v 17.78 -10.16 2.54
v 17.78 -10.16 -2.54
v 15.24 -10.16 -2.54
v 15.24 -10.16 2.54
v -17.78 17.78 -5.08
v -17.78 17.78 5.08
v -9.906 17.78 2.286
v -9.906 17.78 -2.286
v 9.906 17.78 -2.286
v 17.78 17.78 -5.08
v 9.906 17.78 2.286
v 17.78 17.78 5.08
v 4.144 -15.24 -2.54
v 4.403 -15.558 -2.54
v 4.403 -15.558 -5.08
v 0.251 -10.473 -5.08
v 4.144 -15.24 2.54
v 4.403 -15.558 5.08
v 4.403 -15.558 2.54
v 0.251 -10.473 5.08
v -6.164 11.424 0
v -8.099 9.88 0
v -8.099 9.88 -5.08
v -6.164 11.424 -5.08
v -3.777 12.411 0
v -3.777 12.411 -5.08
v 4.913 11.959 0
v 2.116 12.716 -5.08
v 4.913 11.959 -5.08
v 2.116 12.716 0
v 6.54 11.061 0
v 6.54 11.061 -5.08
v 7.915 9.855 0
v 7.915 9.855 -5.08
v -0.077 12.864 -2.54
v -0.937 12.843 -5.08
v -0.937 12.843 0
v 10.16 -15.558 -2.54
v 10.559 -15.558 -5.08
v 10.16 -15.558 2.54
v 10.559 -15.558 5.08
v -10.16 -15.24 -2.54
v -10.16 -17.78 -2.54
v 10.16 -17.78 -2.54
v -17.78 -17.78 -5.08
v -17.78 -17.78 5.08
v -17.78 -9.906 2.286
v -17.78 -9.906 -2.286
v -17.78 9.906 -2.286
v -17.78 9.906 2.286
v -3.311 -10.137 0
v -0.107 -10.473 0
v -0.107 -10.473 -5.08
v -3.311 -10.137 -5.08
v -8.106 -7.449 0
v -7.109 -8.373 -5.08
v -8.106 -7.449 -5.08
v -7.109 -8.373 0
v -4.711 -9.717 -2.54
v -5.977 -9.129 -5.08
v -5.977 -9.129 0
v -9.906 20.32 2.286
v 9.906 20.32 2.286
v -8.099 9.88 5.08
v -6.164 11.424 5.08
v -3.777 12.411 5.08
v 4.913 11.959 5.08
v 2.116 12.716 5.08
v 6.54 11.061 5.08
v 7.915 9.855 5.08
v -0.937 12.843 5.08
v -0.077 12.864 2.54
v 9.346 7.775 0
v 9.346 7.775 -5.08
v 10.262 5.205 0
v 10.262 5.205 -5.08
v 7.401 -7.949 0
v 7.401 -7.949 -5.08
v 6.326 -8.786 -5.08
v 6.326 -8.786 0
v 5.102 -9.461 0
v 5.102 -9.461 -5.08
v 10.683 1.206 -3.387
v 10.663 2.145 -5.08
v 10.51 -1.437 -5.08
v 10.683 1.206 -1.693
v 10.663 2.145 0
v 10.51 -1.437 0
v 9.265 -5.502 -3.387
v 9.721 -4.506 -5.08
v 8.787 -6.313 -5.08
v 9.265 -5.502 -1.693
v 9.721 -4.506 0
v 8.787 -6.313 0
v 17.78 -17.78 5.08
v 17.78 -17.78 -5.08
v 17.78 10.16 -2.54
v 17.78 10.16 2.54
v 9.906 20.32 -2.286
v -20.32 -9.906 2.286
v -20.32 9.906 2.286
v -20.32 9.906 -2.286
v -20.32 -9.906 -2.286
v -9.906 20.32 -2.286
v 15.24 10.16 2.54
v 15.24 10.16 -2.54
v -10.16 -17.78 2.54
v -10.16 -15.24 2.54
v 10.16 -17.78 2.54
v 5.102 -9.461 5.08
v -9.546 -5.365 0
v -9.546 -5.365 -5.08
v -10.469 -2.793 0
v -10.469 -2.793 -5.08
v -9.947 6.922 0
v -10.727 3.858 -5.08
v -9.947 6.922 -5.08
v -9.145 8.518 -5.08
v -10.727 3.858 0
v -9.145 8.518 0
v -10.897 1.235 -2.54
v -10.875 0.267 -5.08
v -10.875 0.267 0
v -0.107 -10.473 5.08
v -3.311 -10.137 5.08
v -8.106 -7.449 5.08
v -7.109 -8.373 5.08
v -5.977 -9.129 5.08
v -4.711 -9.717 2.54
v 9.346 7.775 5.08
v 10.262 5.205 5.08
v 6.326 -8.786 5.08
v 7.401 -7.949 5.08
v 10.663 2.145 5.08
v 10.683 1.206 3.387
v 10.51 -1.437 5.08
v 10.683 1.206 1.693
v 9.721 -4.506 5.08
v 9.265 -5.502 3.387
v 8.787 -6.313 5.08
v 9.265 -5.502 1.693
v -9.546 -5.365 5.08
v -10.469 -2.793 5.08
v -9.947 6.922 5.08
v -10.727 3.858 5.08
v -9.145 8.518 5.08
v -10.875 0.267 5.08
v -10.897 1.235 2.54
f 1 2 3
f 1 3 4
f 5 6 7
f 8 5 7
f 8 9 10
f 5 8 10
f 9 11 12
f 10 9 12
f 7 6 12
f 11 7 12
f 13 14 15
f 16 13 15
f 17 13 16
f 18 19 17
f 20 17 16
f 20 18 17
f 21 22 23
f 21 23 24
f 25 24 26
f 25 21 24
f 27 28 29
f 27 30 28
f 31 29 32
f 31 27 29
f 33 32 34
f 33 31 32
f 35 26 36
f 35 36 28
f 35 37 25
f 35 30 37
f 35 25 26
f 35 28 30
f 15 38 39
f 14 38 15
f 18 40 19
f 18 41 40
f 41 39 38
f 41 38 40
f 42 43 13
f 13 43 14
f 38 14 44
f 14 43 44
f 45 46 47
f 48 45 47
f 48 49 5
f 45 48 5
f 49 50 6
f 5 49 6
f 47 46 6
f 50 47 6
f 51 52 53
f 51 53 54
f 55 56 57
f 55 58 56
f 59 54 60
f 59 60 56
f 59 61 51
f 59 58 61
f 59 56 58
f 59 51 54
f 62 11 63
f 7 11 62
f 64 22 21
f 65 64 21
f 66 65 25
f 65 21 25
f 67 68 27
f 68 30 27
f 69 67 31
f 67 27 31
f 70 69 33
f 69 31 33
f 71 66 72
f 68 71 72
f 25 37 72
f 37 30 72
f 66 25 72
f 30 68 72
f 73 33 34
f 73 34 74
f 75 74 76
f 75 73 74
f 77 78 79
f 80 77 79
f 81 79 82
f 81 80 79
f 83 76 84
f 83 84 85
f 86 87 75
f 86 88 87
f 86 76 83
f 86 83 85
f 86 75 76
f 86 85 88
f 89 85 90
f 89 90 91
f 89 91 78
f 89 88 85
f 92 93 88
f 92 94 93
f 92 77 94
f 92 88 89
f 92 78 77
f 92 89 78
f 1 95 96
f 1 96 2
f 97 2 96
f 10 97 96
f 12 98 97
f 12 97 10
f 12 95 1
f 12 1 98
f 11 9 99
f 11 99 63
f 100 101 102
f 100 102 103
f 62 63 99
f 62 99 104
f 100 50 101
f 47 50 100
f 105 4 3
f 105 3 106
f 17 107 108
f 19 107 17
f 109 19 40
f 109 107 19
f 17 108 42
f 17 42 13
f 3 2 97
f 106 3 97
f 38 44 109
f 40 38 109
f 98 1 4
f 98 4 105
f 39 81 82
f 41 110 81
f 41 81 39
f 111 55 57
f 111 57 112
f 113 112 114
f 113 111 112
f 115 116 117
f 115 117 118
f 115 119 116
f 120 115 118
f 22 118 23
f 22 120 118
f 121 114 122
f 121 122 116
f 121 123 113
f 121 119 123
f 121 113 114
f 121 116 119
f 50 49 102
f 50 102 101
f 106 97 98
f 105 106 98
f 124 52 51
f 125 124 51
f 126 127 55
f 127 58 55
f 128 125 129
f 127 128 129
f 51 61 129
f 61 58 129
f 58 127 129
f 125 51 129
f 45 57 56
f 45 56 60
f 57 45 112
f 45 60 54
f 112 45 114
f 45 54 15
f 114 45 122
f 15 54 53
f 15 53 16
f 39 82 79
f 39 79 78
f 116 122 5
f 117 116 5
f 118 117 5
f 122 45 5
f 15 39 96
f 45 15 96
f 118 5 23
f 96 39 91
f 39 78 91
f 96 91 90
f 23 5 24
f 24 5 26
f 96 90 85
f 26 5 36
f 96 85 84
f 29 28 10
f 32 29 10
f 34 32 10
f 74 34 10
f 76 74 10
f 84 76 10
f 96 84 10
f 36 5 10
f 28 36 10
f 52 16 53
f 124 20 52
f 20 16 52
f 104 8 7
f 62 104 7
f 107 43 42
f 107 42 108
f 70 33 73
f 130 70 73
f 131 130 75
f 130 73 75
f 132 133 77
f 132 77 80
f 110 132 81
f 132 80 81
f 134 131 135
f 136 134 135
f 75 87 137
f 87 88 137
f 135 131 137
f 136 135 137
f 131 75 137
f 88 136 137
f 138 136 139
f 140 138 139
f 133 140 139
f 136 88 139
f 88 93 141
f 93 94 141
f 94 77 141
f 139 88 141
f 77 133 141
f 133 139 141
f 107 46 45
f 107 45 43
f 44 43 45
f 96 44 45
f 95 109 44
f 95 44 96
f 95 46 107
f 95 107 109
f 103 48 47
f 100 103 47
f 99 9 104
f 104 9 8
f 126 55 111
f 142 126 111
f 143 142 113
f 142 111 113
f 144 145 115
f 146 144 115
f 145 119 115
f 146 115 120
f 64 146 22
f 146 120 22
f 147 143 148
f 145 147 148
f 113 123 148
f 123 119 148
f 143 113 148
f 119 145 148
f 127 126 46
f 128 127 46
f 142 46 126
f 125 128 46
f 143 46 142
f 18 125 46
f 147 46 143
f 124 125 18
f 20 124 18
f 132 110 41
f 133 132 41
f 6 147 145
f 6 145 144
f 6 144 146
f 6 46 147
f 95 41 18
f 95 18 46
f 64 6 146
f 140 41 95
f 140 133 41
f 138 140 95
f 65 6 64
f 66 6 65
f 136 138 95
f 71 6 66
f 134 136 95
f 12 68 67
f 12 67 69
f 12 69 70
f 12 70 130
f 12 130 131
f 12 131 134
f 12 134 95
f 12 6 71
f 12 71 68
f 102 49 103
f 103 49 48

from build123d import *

# Parameters (mm, degrees)
F0_W     = 35.56
F0_H     = 35.56
F1_DEPTH = 5.08
F2_W     = 19.812
F2_H     = 4.572
F3_DEPTH = 2.54
F4_W     = 19.812
F4_H     = 4.572
F5_DEPTH = 2.54
F6_W     = 20.32
F6_H     = 5.08
F7_DEPTH = 2.54
F8_W     = 20.32
F8_H     = 5.08
F9_DEPTH = 2.54


with BuildPart() as f1:
    # F0 (on Top) → F1 (new body, symmetric)
    with BuildSketch(Plane.XY):
        Rectangle(F0_W, F0_H)
        with BuildLine():
            add(Edge.make_bspline(
                [(7.9151757813, 9.8549023438), (10.6833789063, 6.84609375), (10.6833789063, 1.2055078125)],
                knots=[0, 0, 0, 1, 1, 1], degree=2))
            add(Edge.make_bspline(
                [(10.6833789063, 1.2055078125), (10.6833789063, -2.79796875), (9.2645507813, -5.5016796875)],
                knots=[0, 0, 0, 1, 1, 1], degree=2))
            add(Edge.make_bspline(
                [(9.2645507813, -5.5016796875), (7.8457226563, -8.205390625), (5.1023242188, -9.4605078125)],
                knots=[0, 0, 0, 1, 1, 1], degree=2))
            Line((5.1023242188, -9.4605078125), (10.5593554688, -15.5575))
            Line((10.5593554688, -15.5575), (4.4028320313, -15.5575))
            Line((4.4028320313, -15.5575), (0.2505273438, -10.4725390625))
            Line((0.2505273438, -10.4725390625), (-0.1066601562, -10.4725390625))
            add(Edge.make_bspline(
                [(-0.1066601562, -10.4725390625), (-5.3156445312, -10.4725390625), (-8.106171875, -7.4488476563)],
                knots=[0, 0, 0, 1, 1, 1], degree=2))
            add(Edge.make_bspline(
                [(-8.106171875, -7.4488476563), (-10.8966992187, -4.42515625), (-10.8966992187, 1.2352734375)],
                knots=[0, 0, 0, 1, 1, 1], degree=2))
            add(Edge.make_bspline(
                [(-10.8966992187, 1.2352734375), (-10.8966992187, 6.895703125), (-8.0987304687, 9.8797070313)],
                knots=[0, 0, 0, 1, 1, 1], degree=2))
            add(Edge.make_bspline(
                [(-8.0987304687, 9.8797070313), (-5.3007617187, 12.8637109375), (-0.0768945312, 12.8637109375)],
                knots=[0, 0, 0, 1, 1, 1], degree=2))
            add(Edge.make_bspline(
                [(-0.0768945312, 12.8637109375), (5.1469726563, 12.8637109375), (7.9151757813, 9.8549023438)],
                knots=[0, 0, 0, 1, 1, 1], degree=2))
        make_face(mode=Mode.SUBTRACT)
    extrude(amount=F1_DEPTH, both=True)

    # F2 (on face) → F3 (join)
    with BuildSketch(Plane(origin=(0, 17.78, 0), x_dir=(-1, 0, 0), z_dir=(0, 1, 0))):
        Rectangle(F2_W, F2_H)
    extrude(amount=F3_DEPTH)

    # F4 (on face) → F5 (join)
    with BuildSketch(Plane(origin=(-17.78, 0, 0), x_dir=(0, -1, 0), z_dir=(-1, 0, 0))):
        Rectangle(F4_W, F4_H)
    extrude(amount=F5_DEPTH)

    # F6 (on face) → F7 (cut)
    with BuildSketch(Plane.XZ.offset(17.78)):
        Rectangle(F6_W, F6_H)
    extrude(amount=-F7_DEPTH, mode=Mode.SUBTRACT)

    # F8 (on face) → F9 (cut)
    with BuildSketch(Plane.YZ.offset(17.78)):
        Rectangle(F8_W, F8_H)
    extrude(amount=-F9_DEPTH, mode=Mode.SUBTRACT)


solid = f1.part
